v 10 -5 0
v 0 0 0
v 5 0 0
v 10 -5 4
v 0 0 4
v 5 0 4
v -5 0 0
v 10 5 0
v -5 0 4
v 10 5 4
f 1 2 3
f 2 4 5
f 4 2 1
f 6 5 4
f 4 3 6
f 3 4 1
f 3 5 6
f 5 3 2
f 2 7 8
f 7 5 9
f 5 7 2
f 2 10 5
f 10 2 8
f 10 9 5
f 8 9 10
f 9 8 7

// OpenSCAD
linear_extrude(height=4) {
    polygon(
        points=[
            [  0, 0 ],
            [  5, 0 ],
            [ 10,-5 ],
        ]
    );
}
linear_extrude(height=4) {
    polygon(
        points=[
            [ -5,  0 ],
            [  0,  0 ],
            [ 10, +5 ],
        ]
    );
}
